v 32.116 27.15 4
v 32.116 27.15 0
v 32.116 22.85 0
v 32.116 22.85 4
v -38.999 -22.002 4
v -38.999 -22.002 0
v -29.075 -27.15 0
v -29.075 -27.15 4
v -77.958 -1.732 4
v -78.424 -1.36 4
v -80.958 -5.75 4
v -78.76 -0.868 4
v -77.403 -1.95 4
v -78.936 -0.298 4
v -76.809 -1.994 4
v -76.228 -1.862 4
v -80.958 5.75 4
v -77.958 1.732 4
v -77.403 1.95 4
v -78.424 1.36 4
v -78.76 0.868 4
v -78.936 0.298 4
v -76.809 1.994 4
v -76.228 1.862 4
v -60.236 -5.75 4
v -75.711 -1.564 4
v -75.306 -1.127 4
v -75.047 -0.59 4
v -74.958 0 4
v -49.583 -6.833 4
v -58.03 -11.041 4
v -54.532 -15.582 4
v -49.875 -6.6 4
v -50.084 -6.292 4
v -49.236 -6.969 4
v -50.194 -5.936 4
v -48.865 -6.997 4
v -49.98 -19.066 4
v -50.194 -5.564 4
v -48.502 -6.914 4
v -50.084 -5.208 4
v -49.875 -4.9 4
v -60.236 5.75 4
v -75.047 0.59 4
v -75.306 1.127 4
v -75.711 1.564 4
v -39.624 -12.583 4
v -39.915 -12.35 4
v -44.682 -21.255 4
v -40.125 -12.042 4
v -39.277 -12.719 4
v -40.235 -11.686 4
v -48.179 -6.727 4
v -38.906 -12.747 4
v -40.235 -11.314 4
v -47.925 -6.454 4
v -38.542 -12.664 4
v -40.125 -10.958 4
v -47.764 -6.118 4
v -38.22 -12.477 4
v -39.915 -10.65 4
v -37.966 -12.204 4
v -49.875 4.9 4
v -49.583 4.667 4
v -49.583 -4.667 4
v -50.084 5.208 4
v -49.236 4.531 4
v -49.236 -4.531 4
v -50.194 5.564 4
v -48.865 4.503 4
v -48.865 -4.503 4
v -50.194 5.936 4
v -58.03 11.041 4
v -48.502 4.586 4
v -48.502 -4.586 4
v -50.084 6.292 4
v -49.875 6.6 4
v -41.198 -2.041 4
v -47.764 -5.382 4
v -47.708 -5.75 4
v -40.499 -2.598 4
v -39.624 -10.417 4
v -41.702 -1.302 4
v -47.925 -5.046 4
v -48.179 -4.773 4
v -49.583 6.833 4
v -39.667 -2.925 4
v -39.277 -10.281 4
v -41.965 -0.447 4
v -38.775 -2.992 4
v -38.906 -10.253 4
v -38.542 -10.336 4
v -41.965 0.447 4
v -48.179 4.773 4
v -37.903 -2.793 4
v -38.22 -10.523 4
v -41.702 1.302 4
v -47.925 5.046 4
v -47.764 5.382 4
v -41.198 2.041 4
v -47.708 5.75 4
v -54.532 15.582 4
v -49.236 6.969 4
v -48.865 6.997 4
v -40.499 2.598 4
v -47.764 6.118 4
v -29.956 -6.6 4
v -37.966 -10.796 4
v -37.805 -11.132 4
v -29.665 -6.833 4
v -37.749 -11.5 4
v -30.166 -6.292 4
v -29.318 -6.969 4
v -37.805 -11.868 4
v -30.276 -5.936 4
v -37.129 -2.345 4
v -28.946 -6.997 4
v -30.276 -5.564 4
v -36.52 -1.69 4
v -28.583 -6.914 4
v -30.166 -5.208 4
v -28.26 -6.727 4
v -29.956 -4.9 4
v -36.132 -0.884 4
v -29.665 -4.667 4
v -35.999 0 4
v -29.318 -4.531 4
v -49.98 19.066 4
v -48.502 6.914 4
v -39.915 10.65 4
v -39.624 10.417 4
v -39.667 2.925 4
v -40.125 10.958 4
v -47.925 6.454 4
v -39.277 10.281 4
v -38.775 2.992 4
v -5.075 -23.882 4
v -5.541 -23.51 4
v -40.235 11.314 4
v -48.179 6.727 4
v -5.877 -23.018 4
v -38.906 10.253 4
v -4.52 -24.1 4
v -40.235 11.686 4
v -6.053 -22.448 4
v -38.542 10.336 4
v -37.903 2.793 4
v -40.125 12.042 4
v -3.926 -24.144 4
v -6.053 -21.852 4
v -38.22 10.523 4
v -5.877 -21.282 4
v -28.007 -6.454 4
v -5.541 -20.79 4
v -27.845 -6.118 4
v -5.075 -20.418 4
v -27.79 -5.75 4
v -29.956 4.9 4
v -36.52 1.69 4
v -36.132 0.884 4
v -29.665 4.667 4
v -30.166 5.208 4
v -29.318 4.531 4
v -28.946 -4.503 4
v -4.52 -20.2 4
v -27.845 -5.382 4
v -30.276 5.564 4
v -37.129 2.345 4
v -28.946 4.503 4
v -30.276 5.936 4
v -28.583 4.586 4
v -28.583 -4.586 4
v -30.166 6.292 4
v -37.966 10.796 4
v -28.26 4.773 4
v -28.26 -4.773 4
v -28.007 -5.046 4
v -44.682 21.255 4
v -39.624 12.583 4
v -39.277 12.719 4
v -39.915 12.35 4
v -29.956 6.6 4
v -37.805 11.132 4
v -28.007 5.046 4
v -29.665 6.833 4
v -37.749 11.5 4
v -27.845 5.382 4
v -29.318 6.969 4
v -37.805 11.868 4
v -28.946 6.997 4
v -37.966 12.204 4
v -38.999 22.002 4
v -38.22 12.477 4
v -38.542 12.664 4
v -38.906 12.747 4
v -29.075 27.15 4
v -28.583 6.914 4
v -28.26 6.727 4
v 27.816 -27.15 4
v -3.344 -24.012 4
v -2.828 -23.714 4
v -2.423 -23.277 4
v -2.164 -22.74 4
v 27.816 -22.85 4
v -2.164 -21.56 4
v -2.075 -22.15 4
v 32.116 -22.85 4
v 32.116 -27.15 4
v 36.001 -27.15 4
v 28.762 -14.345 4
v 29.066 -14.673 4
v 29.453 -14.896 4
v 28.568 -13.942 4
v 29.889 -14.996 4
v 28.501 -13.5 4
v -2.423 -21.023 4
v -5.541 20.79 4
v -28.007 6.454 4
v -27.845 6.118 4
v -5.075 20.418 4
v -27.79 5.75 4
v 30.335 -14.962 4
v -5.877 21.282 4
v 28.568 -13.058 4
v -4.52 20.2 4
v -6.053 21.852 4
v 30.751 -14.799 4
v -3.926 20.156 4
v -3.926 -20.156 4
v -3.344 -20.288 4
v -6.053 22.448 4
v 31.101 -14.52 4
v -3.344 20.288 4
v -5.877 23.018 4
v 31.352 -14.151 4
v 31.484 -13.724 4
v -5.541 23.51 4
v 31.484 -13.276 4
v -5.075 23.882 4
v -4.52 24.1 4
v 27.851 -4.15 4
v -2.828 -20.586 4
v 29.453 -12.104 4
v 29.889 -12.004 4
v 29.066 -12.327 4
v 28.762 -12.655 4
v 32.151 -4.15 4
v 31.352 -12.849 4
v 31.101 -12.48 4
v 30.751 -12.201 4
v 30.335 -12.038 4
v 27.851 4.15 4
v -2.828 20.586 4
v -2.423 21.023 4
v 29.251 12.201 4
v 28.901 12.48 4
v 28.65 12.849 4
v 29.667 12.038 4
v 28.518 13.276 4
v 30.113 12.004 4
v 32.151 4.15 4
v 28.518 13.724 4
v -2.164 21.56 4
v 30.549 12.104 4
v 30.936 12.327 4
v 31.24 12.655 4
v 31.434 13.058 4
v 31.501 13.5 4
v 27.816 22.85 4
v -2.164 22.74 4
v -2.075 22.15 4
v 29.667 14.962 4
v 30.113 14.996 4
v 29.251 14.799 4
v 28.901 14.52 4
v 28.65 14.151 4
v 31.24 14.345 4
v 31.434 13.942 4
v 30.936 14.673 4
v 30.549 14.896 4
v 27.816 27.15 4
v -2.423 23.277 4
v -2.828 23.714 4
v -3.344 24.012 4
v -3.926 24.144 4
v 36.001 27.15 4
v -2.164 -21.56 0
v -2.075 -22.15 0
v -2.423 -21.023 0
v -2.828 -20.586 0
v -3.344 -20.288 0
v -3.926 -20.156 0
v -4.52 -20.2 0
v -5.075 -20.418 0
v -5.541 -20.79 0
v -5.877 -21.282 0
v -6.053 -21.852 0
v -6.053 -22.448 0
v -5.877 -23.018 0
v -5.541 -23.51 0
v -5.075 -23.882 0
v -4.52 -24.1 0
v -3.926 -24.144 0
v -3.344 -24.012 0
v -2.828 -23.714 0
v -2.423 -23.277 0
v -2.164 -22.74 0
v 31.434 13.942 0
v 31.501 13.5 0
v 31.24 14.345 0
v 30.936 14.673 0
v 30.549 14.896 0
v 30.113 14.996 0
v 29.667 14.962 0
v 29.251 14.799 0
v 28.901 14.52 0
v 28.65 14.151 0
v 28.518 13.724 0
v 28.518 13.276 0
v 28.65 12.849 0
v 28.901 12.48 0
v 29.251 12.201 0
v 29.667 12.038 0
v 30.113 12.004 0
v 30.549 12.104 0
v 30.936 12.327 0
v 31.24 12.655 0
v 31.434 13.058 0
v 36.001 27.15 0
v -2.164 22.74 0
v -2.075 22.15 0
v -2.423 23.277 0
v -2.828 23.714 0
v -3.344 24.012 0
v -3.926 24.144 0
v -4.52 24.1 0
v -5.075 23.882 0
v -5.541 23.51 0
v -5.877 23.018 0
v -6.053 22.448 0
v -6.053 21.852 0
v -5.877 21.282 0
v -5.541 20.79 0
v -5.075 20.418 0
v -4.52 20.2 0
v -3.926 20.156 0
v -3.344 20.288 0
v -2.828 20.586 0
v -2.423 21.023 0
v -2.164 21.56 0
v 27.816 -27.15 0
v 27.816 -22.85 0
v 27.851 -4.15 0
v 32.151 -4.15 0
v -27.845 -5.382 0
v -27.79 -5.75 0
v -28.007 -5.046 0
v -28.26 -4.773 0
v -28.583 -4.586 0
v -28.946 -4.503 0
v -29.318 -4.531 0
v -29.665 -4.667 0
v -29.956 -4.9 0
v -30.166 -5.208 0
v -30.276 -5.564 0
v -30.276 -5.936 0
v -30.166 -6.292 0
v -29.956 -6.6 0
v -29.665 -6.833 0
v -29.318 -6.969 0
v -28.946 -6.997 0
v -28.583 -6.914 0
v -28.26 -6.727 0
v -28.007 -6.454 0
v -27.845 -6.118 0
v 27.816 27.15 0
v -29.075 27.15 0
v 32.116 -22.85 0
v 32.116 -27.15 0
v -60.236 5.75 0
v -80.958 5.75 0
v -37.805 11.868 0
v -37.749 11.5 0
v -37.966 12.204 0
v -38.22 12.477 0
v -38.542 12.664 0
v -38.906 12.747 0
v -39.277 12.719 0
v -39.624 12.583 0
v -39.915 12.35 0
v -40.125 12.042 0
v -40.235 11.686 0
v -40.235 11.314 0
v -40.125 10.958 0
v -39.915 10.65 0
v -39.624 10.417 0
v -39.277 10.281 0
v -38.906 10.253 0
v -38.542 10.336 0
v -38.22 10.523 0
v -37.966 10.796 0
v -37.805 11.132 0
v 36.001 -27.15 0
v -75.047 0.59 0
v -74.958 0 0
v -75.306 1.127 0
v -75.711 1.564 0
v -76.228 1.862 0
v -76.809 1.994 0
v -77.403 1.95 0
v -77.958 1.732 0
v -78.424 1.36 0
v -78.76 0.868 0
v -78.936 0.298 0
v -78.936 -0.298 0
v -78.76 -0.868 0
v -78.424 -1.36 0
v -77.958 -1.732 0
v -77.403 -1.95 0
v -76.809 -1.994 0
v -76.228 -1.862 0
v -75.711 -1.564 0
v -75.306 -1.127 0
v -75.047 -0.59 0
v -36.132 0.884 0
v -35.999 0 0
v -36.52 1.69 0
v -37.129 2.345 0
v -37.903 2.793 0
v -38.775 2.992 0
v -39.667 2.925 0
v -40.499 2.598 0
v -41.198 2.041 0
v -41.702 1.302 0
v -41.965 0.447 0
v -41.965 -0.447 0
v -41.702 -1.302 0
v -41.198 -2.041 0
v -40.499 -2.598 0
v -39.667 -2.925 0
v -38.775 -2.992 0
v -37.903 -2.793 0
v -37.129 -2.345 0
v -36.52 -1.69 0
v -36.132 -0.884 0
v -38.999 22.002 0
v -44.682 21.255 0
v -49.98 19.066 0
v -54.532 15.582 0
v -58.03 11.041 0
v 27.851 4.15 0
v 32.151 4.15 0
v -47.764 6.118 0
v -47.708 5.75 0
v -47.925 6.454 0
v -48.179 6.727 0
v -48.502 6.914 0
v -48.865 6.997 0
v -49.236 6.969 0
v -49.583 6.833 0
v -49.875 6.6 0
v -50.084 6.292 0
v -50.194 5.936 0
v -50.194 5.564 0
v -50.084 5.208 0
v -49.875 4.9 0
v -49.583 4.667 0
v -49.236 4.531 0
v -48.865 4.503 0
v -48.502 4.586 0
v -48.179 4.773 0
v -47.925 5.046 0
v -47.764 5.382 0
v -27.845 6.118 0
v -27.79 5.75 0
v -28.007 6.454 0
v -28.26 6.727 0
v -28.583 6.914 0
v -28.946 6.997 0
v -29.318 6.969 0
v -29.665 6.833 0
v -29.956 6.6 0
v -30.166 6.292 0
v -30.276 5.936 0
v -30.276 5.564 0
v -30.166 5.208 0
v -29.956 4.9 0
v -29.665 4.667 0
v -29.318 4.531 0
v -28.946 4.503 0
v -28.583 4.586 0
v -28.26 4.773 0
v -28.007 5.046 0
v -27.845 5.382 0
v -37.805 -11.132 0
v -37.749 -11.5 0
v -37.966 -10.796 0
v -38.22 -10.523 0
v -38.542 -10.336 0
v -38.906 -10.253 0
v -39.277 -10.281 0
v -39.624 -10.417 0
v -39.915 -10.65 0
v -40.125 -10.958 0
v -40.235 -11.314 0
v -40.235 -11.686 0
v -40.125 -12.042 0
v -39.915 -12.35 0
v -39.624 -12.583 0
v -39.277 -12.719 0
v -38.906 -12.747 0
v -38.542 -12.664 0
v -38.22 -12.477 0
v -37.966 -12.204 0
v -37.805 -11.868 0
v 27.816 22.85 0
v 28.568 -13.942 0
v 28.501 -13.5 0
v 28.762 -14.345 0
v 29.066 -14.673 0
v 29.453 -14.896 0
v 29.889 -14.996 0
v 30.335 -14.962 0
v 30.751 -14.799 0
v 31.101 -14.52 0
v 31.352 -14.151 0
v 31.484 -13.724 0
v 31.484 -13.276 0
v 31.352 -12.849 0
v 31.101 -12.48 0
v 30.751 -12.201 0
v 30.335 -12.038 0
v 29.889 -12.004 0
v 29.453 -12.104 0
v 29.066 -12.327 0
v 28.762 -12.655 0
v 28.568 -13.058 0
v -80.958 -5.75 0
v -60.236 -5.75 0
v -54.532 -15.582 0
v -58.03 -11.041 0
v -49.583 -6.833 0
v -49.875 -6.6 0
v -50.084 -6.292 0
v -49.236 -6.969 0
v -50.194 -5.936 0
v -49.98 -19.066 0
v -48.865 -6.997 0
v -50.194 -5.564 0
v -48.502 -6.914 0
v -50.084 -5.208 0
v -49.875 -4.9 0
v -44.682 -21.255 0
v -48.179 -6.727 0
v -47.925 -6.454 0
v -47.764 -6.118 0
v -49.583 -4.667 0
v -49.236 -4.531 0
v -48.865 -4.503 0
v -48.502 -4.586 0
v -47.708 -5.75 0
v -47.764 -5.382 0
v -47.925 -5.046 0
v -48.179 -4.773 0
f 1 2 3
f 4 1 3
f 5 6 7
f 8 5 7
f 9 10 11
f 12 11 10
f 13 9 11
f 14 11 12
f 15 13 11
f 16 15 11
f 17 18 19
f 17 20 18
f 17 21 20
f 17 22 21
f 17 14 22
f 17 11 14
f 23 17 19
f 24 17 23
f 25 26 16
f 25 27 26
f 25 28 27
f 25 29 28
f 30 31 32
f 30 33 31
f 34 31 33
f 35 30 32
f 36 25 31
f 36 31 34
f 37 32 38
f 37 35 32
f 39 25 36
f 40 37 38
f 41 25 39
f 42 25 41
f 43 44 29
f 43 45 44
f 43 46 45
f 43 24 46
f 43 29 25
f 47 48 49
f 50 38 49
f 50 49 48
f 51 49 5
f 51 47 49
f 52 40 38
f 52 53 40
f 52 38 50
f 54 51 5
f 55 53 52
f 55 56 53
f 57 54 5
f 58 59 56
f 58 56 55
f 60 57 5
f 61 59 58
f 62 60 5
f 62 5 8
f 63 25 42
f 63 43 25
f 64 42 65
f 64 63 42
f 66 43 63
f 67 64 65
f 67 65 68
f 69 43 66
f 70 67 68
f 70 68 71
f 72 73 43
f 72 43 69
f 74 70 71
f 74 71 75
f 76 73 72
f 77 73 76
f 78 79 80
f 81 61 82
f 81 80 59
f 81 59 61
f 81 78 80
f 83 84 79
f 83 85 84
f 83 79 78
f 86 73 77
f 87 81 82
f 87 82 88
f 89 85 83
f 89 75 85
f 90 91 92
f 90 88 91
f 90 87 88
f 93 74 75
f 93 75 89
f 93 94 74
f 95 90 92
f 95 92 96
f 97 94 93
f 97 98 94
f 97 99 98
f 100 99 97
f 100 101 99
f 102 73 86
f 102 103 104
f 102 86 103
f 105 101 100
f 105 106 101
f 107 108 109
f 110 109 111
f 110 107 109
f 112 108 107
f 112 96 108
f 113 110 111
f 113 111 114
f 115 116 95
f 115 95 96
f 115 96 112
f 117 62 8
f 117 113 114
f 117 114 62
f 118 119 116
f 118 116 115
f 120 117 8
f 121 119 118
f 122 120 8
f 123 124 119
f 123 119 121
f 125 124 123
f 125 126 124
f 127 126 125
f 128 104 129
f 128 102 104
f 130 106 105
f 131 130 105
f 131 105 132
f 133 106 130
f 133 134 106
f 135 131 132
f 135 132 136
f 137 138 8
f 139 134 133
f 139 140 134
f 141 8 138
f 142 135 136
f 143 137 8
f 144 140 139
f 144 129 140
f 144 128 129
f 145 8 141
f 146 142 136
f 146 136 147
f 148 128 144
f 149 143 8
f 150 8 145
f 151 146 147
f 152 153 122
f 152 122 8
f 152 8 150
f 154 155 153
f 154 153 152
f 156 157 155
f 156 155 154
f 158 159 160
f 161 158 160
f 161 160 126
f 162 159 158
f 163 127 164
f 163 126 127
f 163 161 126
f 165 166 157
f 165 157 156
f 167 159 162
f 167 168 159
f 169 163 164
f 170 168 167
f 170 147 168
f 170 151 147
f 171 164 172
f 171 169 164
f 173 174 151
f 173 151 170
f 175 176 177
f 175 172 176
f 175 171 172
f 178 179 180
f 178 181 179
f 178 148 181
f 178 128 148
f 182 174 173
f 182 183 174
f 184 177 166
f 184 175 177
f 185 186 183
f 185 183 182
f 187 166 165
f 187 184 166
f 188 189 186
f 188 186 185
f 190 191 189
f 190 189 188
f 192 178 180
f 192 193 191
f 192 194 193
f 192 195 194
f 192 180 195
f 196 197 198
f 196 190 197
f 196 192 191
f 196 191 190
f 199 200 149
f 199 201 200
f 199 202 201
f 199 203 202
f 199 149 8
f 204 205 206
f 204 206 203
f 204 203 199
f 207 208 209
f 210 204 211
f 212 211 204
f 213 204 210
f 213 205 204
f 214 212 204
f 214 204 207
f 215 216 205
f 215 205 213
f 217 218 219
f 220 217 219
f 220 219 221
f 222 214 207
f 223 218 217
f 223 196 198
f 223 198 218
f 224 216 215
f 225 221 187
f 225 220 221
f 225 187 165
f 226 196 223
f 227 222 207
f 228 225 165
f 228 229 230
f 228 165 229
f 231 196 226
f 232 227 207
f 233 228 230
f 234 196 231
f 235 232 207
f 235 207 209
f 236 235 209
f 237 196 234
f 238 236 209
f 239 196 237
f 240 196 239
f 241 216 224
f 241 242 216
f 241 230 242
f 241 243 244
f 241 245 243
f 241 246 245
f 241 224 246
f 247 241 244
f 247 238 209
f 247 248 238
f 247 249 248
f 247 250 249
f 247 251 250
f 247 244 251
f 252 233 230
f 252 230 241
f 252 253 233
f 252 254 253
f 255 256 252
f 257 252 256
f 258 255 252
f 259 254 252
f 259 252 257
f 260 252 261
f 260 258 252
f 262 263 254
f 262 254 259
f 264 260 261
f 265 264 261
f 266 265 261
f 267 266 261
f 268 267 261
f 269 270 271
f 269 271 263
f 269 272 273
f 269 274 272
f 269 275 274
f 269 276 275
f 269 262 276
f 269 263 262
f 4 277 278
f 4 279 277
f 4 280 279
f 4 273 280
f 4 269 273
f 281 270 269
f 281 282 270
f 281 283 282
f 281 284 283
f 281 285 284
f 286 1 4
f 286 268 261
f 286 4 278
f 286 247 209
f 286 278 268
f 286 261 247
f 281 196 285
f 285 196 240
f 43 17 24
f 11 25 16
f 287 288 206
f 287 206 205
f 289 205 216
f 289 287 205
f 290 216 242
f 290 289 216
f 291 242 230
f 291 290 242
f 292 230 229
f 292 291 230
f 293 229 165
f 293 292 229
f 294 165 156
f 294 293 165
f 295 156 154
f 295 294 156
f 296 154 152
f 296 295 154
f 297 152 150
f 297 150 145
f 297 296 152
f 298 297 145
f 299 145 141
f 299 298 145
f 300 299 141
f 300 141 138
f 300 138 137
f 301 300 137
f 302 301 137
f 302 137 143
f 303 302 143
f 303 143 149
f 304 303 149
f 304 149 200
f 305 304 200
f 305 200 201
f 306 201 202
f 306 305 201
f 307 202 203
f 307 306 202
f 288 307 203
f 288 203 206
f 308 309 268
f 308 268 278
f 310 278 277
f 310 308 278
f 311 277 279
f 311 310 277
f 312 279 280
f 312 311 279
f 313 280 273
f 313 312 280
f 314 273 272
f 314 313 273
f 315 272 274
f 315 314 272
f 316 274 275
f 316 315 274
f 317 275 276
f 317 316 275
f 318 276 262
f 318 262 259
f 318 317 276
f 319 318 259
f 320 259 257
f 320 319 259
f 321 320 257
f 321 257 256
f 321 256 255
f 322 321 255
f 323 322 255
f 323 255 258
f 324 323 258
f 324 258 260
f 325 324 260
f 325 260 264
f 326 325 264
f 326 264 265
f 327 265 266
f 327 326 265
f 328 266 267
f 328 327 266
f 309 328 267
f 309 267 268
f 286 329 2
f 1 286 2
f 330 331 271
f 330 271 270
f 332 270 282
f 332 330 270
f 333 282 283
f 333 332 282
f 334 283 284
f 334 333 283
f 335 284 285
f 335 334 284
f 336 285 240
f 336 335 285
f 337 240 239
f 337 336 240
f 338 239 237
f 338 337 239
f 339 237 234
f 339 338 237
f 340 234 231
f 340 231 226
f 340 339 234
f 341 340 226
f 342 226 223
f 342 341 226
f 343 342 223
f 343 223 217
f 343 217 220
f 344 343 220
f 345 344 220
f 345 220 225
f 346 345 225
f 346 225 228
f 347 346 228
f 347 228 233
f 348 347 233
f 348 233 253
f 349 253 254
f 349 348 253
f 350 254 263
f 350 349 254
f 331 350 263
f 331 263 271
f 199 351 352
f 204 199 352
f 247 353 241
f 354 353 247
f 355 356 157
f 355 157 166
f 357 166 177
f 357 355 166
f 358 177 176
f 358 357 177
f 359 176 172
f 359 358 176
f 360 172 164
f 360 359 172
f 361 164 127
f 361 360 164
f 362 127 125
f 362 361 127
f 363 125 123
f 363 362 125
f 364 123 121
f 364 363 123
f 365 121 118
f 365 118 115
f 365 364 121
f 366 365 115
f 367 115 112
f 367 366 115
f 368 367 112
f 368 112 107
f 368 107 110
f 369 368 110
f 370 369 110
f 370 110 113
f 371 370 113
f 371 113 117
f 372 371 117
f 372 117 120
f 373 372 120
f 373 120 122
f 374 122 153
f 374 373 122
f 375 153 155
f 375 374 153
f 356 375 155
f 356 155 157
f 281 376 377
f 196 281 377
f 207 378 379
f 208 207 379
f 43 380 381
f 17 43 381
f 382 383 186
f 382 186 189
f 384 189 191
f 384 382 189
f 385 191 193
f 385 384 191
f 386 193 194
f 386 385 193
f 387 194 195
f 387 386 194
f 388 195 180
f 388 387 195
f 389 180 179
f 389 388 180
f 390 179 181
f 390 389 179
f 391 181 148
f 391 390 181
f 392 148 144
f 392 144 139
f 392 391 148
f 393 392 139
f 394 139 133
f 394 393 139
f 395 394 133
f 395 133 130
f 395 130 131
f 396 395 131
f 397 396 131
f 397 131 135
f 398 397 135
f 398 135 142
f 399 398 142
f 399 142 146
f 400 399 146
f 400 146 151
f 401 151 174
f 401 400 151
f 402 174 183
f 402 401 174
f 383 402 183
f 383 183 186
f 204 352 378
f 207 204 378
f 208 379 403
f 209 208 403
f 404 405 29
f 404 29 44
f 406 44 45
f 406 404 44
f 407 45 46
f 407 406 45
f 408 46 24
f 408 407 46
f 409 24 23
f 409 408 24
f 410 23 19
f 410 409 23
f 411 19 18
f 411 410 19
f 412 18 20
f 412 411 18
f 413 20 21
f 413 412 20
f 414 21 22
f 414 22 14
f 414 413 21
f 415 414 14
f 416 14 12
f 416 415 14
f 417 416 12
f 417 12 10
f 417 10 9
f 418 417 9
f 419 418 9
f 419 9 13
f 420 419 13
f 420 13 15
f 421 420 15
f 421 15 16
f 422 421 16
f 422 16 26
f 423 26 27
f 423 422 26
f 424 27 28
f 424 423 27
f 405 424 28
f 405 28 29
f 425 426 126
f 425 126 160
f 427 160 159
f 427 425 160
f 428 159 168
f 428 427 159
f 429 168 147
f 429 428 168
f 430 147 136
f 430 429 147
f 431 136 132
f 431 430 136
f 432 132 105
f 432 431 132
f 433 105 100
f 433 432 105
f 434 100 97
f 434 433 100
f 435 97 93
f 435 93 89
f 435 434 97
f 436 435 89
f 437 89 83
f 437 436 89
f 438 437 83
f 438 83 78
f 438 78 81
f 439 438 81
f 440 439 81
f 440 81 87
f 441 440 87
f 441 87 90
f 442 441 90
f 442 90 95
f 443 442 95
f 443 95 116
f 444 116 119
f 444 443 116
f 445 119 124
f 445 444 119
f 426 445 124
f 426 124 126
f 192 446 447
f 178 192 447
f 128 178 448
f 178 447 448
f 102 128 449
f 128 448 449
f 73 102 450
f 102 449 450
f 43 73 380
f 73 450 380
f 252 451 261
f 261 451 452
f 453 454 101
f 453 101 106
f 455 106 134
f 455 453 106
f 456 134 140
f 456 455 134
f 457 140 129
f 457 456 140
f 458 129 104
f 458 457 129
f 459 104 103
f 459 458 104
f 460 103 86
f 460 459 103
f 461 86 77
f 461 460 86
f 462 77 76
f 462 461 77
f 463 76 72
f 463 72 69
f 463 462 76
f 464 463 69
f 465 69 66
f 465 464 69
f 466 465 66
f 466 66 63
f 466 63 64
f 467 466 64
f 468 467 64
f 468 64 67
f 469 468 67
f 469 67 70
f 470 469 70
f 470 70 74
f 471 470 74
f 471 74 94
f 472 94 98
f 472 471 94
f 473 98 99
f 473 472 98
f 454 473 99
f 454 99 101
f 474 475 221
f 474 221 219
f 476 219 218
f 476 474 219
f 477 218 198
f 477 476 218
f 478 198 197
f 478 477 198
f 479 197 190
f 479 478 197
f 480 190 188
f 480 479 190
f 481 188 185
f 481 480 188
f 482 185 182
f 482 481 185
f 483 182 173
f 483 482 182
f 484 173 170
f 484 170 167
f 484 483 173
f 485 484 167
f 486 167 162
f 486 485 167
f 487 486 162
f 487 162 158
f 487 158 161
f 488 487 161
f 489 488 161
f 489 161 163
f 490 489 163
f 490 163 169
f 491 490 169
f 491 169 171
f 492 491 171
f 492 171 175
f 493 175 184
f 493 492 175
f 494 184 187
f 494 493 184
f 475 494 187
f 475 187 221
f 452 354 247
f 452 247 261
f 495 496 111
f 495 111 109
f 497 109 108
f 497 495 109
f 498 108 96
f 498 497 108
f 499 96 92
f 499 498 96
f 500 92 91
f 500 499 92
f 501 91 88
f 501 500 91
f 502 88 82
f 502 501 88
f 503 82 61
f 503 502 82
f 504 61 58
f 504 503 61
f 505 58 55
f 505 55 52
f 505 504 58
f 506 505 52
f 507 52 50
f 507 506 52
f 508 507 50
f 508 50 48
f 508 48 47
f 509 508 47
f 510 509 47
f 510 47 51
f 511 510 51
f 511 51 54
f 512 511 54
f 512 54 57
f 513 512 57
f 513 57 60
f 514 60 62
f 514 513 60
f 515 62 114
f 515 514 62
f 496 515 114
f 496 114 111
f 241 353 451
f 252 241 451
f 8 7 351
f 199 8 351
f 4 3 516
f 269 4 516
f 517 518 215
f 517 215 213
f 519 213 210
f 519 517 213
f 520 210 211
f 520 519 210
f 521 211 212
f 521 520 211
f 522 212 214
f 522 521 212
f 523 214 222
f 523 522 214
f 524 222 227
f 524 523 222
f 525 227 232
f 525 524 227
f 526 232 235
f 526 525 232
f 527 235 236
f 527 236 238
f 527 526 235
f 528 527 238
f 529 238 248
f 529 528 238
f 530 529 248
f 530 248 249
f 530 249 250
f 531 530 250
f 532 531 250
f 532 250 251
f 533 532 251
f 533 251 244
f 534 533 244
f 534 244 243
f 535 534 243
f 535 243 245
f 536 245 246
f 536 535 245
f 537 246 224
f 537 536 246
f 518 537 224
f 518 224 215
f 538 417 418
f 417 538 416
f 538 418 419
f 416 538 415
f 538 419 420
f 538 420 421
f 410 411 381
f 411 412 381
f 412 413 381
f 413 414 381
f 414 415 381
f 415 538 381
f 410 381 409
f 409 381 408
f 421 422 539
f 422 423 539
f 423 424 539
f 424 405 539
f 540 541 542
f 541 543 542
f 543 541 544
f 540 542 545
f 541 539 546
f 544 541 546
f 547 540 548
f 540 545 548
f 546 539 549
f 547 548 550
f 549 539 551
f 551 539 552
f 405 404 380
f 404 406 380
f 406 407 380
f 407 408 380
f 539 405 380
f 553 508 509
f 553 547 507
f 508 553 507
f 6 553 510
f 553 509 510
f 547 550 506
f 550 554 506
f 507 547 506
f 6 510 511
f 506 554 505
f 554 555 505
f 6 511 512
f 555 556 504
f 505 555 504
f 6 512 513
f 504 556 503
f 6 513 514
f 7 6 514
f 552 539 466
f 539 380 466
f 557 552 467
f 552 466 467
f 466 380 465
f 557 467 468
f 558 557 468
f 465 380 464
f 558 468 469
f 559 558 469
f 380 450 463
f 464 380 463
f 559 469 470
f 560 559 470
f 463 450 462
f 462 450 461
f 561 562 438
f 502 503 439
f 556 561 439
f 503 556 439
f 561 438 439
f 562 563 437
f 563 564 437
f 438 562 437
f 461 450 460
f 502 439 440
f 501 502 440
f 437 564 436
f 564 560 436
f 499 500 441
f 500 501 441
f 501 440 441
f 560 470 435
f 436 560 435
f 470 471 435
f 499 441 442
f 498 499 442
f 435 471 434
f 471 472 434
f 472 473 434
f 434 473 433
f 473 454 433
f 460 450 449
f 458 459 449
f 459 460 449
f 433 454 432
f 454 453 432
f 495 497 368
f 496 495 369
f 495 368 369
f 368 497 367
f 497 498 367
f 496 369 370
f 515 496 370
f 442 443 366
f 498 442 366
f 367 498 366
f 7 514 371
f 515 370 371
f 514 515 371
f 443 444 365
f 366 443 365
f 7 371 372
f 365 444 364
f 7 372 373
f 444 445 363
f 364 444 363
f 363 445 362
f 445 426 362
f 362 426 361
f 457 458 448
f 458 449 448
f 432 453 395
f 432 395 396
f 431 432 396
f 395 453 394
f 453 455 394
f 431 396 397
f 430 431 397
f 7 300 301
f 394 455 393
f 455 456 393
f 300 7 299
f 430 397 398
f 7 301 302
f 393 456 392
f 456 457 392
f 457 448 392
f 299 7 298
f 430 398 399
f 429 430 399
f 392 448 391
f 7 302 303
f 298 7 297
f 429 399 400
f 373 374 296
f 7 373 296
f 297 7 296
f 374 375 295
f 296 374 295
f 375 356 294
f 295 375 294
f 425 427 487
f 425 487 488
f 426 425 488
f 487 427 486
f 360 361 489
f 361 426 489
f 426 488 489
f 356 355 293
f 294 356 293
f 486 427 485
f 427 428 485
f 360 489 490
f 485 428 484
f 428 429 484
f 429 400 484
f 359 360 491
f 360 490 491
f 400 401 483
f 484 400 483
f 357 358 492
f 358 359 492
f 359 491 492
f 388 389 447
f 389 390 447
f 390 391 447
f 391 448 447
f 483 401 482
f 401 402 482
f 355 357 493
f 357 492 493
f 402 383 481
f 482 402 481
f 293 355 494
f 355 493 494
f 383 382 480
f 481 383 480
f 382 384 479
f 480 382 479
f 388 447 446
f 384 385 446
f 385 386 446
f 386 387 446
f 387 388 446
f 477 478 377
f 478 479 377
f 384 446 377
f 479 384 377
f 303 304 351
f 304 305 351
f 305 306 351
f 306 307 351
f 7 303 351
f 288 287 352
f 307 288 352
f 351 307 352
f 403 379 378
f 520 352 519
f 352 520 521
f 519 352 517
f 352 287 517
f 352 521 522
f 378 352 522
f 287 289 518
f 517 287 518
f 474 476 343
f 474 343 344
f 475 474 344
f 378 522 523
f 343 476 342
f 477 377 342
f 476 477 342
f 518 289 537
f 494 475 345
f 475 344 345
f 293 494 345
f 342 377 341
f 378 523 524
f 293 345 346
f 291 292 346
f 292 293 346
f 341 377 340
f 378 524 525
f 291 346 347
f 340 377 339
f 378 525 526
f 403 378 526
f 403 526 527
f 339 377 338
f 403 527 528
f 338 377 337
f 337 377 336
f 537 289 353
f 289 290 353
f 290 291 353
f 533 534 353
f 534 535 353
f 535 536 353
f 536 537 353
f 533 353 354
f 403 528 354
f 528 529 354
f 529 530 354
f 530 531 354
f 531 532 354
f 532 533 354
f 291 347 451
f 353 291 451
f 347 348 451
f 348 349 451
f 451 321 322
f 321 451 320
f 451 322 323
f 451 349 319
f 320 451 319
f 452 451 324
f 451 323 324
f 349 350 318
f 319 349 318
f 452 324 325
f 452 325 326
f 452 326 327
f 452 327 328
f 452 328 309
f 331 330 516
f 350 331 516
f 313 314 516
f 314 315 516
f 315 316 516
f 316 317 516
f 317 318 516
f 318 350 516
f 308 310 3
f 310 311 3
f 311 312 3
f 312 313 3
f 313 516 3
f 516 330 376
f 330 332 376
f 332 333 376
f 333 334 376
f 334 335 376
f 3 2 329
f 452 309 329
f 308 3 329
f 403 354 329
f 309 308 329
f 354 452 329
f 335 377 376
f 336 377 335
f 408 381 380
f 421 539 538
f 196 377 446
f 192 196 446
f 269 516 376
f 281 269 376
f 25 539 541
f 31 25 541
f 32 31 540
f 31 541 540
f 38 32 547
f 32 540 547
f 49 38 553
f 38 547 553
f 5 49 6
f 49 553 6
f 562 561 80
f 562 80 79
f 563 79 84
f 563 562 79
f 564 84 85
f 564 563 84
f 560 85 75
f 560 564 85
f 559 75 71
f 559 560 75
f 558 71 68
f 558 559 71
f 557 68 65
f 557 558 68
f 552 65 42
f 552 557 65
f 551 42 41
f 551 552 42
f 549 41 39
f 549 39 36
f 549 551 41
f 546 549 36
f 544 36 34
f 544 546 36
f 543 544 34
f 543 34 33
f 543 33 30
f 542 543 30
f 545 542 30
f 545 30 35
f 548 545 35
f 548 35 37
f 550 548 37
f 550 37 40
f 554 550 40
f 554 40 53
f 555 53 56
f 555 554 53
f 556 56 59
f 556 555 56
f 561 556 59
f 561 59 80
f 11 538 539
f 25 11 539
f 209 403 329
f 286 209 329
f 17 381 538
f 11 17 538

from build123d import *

# Parameters (mm, degrees)
SKETCH_1_R      = 1.5
SKETCH_1_R_2    = 3
SKETCH_1_R_3    = 1.25
SKETCH_1_R_4    = 2
SKETCH_1_W      = 4.3
SKETCH_1_H      = 8.3
EXTRUDE_1_DEPTH = 4


with BuildPart() as part:
    # 草图1 → 凸台-拉伸1 (new body)
    with BuildSketch(Plane.XY):
        with BuildLine():
            Line((32.115707856, 27.15), (32.115707856, 22.85))
            Line((32.115707856, 22.85), (27.815707856, 22.85))
            Line((27.815707856, 22.85), (27.815707856, 27.15))
            Line((27.815707856, 27.15), (-29.075, 27.15))
            Line((-29.075, 27.15), (-38.998995168, 22.002009663))
            ThreePointArc((-38.998995168, 22.002009663), (-52.370174504, 17.472835843), (-60.236366221, 5.75))
            Line((-60.236366221, 5.75), (-80.958287312, 5.75))
            Line((-80.958287312, 5.75), (-80.958287312, -5.75))
            Line((-80.958287312, -5.75), (-60.236366221, -5.75))
            ThreePointArc((-60.236366221, -5.75), (-52.370174504, -17.472835843), (-38.998995168, -22.002009663))
            Line((-38.998995168, -22.002009663), (-29.075, -27.15))
            Line((-29.075, -27.15), (27.815707856, -27.15))
            Line((27.815707856, -27.15), (27.815707856, -22.85))
            Line((27.815707856, -22.85), (32.115707856, -22.85))
            Line((32.115707856, -22.85), (32.115707856, -27.15))
            Line((32.115707856, -27.15), (36.001004832, -27.15))
            Line((36.001004832, -27.15), (36.001004832, 27.15))
            Line((36.001004832, 27.15), (32.115707856, 27.15))
        make_face()
        with Locations((30.001004832, 13.5)):
            Circle(SKETCH_1_R, mode=Mode.SUBTRACT)
        with Locations(Location((30.001004832, -13.5, 0), (0, 0, 180))):
            Circle(SKETCH_1_R, mode=Mode.SUBTRACT)
        with Locations((-38.998995168, 0)):
            Circle(SKETCH_1_R_2, mode=Mode.SUBTRACT)
        with Locations((-38.998995168, -11.5)):
            Circle(SKETCH_1_R_3, mode=Mode.SUBTRACT)
        with Locations((-48.958287312, -5.75)):
            Circle(SKETCH_1_R_3, mode=Mode.SUBTRACT)
        with Locations((-48.958287312, 5.75)):
            Circle(SKETCH_1_R_3, mode=Mode.SUBTRACT)
        with Locations((-38.998995168, 11.5)):
            Circle(SKETCH_1_R_3, mode=Mode.SUBTRACT)
        with Locations((-29.039703025, 5.75)):
            Circle(SKETCH_1_R_3, mode=Mode.SUBTRACT)
        with Locations((-29.039703025, -5.75)):
            Circle(SKETCH_1_R_3, mode=Mode.SUBTRACT)
        with Locations((-4.075, -22.15)):
            Circle(SKETCH_1_R_4, mode=Mode.SUBTRACT)
        with Locations((-4.075, 22.15)):
            Circle(SKETCH_1_R_4, mode=Mode.SUBTRACT)
        with Locations((-76.958287312, 0)):
            Circle(SKETCH_1_R_4, mode=Mode.SUBTRACT)
        with Locations((30.001004832, 0)):
            Rectangle(SKETCH_1_W, SKETCH_1_H, mode=Mode.SUBTRACT)
    extrude(amount=EXTRUDE_1_DEPTH)


solid = part.part
